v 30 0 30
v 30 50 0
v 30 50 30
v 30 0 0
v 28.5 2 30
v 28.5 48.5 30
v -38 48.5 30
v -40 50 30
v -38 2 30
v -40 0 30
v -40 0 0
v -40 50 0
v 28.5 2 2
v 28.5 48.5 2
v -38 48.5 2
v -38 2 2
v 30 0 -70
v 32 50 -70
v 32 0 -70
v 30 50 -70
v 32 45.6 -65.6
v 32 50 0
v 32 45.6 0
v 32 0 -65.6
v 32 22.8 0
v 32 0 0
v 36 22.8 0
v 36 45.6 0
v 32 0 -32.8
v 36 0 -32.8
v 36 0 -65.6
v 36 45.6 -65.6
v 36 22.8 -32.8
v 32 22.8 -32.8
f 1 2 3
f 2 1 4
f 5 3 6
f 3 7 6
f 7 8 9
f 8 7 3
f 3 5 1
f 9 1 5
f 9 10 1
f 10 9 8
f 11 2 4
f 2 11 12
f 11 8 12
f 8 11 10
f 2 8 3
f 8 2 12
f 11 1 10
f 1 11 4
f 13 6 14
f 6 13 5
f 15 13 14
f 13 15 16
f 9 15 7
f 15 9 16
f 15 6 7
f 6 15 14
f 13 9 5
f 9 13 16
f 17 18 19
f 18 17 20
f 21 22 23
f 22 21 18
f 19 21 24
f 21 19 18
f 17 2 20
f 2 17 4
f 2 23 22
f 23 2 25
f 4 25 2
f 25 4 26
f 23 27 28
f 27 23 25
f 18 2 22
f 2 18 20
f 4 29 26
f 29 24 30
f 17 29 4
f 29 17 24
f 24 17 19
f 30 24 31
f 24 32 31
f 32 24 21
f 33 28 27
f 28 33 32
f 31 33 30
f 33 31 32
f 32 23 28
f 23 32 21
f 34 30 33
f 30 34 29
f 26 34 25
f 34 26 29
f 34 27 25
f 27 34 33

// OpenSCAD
// Two-part enclosure for a small electronics board (e.g. Arduino-based temperature logger)
// Print orientation: both parts lie on the bed (z = 0), side by side, with a 10 mm gap.
// The box is open-topped; the lid is printed upside down and slides into the box opening.
// Units: mm. No external libraries.

// ---------------- Parameters ----------------
box_x      = 70;    // box outer length (X)
box_y      = 50;    // box outer width (Y)
box_h      = 30;    // box outer height (Z)
wall       = 2;     // box wall thickness
floor      = 2;     // box floor thickness
eps        = 0.5;   // cutter overshoot past faces

lip_t      = 1.5;   // lid wall thickness
lip_h      = 4;     // lid lip height
lip_x      = 65.6;  // lid outer length (X)
lip_y      = 45.6;  // lid outer width (Y)
clearance  = 0.2;   // clearance between lid and box opening
gap        = 10;    // gap between the two parts on the bed

$fn = 64;

// ---------------- Derived ----------------
box_i_x = box_x - 2 * wall;   // inner length
box_i_y = box_y - 2 * wall;   // inner width
box_i_h = box_h - floor;      // inner height (floor under, open top)

// ---------------- Models ----------------
module box() {
    difference() {
        cube([box_x, box_y, box_h]);
        // open the top: cut a block above the floor, through the walls and ceiling
        translate([wall, wall, floor])
            cube([box_i_x + eps, box_i_y + eps, box_i_h + eps]);
    }
}

module lid() {
    // Plate base
    t = 2;  // plate thickness
    // Rectangular lip on top of the plate, centred on it
    // (printed upside down, the lip becomes an undercut that snaps into the box)
    difference() {
        union() {
            cube([box_x, box_y, t]);
            cube([lip_x, lip_y, t + lip_h]);
        }
        // cut the lip's top face so the wall is exactly lip_t thick
        translate([-lip_x / 2, -lip_y / 2, t])
            cube([lip_x, lip_y, lip_h + eps]);
    }
}

// ---------------- Assembly ----------------
translate([-box_x / 2 - gap / 2, 0, 0]) box();      // box on -X side
translate([box_x / 2 - gap / 2, 0, 0]) rotate([0, 90, 0]) lid();  // lid on +X side, upside down

// Result: a single print with two parts, 10 mm apart, the lid sliding into the box opening.
